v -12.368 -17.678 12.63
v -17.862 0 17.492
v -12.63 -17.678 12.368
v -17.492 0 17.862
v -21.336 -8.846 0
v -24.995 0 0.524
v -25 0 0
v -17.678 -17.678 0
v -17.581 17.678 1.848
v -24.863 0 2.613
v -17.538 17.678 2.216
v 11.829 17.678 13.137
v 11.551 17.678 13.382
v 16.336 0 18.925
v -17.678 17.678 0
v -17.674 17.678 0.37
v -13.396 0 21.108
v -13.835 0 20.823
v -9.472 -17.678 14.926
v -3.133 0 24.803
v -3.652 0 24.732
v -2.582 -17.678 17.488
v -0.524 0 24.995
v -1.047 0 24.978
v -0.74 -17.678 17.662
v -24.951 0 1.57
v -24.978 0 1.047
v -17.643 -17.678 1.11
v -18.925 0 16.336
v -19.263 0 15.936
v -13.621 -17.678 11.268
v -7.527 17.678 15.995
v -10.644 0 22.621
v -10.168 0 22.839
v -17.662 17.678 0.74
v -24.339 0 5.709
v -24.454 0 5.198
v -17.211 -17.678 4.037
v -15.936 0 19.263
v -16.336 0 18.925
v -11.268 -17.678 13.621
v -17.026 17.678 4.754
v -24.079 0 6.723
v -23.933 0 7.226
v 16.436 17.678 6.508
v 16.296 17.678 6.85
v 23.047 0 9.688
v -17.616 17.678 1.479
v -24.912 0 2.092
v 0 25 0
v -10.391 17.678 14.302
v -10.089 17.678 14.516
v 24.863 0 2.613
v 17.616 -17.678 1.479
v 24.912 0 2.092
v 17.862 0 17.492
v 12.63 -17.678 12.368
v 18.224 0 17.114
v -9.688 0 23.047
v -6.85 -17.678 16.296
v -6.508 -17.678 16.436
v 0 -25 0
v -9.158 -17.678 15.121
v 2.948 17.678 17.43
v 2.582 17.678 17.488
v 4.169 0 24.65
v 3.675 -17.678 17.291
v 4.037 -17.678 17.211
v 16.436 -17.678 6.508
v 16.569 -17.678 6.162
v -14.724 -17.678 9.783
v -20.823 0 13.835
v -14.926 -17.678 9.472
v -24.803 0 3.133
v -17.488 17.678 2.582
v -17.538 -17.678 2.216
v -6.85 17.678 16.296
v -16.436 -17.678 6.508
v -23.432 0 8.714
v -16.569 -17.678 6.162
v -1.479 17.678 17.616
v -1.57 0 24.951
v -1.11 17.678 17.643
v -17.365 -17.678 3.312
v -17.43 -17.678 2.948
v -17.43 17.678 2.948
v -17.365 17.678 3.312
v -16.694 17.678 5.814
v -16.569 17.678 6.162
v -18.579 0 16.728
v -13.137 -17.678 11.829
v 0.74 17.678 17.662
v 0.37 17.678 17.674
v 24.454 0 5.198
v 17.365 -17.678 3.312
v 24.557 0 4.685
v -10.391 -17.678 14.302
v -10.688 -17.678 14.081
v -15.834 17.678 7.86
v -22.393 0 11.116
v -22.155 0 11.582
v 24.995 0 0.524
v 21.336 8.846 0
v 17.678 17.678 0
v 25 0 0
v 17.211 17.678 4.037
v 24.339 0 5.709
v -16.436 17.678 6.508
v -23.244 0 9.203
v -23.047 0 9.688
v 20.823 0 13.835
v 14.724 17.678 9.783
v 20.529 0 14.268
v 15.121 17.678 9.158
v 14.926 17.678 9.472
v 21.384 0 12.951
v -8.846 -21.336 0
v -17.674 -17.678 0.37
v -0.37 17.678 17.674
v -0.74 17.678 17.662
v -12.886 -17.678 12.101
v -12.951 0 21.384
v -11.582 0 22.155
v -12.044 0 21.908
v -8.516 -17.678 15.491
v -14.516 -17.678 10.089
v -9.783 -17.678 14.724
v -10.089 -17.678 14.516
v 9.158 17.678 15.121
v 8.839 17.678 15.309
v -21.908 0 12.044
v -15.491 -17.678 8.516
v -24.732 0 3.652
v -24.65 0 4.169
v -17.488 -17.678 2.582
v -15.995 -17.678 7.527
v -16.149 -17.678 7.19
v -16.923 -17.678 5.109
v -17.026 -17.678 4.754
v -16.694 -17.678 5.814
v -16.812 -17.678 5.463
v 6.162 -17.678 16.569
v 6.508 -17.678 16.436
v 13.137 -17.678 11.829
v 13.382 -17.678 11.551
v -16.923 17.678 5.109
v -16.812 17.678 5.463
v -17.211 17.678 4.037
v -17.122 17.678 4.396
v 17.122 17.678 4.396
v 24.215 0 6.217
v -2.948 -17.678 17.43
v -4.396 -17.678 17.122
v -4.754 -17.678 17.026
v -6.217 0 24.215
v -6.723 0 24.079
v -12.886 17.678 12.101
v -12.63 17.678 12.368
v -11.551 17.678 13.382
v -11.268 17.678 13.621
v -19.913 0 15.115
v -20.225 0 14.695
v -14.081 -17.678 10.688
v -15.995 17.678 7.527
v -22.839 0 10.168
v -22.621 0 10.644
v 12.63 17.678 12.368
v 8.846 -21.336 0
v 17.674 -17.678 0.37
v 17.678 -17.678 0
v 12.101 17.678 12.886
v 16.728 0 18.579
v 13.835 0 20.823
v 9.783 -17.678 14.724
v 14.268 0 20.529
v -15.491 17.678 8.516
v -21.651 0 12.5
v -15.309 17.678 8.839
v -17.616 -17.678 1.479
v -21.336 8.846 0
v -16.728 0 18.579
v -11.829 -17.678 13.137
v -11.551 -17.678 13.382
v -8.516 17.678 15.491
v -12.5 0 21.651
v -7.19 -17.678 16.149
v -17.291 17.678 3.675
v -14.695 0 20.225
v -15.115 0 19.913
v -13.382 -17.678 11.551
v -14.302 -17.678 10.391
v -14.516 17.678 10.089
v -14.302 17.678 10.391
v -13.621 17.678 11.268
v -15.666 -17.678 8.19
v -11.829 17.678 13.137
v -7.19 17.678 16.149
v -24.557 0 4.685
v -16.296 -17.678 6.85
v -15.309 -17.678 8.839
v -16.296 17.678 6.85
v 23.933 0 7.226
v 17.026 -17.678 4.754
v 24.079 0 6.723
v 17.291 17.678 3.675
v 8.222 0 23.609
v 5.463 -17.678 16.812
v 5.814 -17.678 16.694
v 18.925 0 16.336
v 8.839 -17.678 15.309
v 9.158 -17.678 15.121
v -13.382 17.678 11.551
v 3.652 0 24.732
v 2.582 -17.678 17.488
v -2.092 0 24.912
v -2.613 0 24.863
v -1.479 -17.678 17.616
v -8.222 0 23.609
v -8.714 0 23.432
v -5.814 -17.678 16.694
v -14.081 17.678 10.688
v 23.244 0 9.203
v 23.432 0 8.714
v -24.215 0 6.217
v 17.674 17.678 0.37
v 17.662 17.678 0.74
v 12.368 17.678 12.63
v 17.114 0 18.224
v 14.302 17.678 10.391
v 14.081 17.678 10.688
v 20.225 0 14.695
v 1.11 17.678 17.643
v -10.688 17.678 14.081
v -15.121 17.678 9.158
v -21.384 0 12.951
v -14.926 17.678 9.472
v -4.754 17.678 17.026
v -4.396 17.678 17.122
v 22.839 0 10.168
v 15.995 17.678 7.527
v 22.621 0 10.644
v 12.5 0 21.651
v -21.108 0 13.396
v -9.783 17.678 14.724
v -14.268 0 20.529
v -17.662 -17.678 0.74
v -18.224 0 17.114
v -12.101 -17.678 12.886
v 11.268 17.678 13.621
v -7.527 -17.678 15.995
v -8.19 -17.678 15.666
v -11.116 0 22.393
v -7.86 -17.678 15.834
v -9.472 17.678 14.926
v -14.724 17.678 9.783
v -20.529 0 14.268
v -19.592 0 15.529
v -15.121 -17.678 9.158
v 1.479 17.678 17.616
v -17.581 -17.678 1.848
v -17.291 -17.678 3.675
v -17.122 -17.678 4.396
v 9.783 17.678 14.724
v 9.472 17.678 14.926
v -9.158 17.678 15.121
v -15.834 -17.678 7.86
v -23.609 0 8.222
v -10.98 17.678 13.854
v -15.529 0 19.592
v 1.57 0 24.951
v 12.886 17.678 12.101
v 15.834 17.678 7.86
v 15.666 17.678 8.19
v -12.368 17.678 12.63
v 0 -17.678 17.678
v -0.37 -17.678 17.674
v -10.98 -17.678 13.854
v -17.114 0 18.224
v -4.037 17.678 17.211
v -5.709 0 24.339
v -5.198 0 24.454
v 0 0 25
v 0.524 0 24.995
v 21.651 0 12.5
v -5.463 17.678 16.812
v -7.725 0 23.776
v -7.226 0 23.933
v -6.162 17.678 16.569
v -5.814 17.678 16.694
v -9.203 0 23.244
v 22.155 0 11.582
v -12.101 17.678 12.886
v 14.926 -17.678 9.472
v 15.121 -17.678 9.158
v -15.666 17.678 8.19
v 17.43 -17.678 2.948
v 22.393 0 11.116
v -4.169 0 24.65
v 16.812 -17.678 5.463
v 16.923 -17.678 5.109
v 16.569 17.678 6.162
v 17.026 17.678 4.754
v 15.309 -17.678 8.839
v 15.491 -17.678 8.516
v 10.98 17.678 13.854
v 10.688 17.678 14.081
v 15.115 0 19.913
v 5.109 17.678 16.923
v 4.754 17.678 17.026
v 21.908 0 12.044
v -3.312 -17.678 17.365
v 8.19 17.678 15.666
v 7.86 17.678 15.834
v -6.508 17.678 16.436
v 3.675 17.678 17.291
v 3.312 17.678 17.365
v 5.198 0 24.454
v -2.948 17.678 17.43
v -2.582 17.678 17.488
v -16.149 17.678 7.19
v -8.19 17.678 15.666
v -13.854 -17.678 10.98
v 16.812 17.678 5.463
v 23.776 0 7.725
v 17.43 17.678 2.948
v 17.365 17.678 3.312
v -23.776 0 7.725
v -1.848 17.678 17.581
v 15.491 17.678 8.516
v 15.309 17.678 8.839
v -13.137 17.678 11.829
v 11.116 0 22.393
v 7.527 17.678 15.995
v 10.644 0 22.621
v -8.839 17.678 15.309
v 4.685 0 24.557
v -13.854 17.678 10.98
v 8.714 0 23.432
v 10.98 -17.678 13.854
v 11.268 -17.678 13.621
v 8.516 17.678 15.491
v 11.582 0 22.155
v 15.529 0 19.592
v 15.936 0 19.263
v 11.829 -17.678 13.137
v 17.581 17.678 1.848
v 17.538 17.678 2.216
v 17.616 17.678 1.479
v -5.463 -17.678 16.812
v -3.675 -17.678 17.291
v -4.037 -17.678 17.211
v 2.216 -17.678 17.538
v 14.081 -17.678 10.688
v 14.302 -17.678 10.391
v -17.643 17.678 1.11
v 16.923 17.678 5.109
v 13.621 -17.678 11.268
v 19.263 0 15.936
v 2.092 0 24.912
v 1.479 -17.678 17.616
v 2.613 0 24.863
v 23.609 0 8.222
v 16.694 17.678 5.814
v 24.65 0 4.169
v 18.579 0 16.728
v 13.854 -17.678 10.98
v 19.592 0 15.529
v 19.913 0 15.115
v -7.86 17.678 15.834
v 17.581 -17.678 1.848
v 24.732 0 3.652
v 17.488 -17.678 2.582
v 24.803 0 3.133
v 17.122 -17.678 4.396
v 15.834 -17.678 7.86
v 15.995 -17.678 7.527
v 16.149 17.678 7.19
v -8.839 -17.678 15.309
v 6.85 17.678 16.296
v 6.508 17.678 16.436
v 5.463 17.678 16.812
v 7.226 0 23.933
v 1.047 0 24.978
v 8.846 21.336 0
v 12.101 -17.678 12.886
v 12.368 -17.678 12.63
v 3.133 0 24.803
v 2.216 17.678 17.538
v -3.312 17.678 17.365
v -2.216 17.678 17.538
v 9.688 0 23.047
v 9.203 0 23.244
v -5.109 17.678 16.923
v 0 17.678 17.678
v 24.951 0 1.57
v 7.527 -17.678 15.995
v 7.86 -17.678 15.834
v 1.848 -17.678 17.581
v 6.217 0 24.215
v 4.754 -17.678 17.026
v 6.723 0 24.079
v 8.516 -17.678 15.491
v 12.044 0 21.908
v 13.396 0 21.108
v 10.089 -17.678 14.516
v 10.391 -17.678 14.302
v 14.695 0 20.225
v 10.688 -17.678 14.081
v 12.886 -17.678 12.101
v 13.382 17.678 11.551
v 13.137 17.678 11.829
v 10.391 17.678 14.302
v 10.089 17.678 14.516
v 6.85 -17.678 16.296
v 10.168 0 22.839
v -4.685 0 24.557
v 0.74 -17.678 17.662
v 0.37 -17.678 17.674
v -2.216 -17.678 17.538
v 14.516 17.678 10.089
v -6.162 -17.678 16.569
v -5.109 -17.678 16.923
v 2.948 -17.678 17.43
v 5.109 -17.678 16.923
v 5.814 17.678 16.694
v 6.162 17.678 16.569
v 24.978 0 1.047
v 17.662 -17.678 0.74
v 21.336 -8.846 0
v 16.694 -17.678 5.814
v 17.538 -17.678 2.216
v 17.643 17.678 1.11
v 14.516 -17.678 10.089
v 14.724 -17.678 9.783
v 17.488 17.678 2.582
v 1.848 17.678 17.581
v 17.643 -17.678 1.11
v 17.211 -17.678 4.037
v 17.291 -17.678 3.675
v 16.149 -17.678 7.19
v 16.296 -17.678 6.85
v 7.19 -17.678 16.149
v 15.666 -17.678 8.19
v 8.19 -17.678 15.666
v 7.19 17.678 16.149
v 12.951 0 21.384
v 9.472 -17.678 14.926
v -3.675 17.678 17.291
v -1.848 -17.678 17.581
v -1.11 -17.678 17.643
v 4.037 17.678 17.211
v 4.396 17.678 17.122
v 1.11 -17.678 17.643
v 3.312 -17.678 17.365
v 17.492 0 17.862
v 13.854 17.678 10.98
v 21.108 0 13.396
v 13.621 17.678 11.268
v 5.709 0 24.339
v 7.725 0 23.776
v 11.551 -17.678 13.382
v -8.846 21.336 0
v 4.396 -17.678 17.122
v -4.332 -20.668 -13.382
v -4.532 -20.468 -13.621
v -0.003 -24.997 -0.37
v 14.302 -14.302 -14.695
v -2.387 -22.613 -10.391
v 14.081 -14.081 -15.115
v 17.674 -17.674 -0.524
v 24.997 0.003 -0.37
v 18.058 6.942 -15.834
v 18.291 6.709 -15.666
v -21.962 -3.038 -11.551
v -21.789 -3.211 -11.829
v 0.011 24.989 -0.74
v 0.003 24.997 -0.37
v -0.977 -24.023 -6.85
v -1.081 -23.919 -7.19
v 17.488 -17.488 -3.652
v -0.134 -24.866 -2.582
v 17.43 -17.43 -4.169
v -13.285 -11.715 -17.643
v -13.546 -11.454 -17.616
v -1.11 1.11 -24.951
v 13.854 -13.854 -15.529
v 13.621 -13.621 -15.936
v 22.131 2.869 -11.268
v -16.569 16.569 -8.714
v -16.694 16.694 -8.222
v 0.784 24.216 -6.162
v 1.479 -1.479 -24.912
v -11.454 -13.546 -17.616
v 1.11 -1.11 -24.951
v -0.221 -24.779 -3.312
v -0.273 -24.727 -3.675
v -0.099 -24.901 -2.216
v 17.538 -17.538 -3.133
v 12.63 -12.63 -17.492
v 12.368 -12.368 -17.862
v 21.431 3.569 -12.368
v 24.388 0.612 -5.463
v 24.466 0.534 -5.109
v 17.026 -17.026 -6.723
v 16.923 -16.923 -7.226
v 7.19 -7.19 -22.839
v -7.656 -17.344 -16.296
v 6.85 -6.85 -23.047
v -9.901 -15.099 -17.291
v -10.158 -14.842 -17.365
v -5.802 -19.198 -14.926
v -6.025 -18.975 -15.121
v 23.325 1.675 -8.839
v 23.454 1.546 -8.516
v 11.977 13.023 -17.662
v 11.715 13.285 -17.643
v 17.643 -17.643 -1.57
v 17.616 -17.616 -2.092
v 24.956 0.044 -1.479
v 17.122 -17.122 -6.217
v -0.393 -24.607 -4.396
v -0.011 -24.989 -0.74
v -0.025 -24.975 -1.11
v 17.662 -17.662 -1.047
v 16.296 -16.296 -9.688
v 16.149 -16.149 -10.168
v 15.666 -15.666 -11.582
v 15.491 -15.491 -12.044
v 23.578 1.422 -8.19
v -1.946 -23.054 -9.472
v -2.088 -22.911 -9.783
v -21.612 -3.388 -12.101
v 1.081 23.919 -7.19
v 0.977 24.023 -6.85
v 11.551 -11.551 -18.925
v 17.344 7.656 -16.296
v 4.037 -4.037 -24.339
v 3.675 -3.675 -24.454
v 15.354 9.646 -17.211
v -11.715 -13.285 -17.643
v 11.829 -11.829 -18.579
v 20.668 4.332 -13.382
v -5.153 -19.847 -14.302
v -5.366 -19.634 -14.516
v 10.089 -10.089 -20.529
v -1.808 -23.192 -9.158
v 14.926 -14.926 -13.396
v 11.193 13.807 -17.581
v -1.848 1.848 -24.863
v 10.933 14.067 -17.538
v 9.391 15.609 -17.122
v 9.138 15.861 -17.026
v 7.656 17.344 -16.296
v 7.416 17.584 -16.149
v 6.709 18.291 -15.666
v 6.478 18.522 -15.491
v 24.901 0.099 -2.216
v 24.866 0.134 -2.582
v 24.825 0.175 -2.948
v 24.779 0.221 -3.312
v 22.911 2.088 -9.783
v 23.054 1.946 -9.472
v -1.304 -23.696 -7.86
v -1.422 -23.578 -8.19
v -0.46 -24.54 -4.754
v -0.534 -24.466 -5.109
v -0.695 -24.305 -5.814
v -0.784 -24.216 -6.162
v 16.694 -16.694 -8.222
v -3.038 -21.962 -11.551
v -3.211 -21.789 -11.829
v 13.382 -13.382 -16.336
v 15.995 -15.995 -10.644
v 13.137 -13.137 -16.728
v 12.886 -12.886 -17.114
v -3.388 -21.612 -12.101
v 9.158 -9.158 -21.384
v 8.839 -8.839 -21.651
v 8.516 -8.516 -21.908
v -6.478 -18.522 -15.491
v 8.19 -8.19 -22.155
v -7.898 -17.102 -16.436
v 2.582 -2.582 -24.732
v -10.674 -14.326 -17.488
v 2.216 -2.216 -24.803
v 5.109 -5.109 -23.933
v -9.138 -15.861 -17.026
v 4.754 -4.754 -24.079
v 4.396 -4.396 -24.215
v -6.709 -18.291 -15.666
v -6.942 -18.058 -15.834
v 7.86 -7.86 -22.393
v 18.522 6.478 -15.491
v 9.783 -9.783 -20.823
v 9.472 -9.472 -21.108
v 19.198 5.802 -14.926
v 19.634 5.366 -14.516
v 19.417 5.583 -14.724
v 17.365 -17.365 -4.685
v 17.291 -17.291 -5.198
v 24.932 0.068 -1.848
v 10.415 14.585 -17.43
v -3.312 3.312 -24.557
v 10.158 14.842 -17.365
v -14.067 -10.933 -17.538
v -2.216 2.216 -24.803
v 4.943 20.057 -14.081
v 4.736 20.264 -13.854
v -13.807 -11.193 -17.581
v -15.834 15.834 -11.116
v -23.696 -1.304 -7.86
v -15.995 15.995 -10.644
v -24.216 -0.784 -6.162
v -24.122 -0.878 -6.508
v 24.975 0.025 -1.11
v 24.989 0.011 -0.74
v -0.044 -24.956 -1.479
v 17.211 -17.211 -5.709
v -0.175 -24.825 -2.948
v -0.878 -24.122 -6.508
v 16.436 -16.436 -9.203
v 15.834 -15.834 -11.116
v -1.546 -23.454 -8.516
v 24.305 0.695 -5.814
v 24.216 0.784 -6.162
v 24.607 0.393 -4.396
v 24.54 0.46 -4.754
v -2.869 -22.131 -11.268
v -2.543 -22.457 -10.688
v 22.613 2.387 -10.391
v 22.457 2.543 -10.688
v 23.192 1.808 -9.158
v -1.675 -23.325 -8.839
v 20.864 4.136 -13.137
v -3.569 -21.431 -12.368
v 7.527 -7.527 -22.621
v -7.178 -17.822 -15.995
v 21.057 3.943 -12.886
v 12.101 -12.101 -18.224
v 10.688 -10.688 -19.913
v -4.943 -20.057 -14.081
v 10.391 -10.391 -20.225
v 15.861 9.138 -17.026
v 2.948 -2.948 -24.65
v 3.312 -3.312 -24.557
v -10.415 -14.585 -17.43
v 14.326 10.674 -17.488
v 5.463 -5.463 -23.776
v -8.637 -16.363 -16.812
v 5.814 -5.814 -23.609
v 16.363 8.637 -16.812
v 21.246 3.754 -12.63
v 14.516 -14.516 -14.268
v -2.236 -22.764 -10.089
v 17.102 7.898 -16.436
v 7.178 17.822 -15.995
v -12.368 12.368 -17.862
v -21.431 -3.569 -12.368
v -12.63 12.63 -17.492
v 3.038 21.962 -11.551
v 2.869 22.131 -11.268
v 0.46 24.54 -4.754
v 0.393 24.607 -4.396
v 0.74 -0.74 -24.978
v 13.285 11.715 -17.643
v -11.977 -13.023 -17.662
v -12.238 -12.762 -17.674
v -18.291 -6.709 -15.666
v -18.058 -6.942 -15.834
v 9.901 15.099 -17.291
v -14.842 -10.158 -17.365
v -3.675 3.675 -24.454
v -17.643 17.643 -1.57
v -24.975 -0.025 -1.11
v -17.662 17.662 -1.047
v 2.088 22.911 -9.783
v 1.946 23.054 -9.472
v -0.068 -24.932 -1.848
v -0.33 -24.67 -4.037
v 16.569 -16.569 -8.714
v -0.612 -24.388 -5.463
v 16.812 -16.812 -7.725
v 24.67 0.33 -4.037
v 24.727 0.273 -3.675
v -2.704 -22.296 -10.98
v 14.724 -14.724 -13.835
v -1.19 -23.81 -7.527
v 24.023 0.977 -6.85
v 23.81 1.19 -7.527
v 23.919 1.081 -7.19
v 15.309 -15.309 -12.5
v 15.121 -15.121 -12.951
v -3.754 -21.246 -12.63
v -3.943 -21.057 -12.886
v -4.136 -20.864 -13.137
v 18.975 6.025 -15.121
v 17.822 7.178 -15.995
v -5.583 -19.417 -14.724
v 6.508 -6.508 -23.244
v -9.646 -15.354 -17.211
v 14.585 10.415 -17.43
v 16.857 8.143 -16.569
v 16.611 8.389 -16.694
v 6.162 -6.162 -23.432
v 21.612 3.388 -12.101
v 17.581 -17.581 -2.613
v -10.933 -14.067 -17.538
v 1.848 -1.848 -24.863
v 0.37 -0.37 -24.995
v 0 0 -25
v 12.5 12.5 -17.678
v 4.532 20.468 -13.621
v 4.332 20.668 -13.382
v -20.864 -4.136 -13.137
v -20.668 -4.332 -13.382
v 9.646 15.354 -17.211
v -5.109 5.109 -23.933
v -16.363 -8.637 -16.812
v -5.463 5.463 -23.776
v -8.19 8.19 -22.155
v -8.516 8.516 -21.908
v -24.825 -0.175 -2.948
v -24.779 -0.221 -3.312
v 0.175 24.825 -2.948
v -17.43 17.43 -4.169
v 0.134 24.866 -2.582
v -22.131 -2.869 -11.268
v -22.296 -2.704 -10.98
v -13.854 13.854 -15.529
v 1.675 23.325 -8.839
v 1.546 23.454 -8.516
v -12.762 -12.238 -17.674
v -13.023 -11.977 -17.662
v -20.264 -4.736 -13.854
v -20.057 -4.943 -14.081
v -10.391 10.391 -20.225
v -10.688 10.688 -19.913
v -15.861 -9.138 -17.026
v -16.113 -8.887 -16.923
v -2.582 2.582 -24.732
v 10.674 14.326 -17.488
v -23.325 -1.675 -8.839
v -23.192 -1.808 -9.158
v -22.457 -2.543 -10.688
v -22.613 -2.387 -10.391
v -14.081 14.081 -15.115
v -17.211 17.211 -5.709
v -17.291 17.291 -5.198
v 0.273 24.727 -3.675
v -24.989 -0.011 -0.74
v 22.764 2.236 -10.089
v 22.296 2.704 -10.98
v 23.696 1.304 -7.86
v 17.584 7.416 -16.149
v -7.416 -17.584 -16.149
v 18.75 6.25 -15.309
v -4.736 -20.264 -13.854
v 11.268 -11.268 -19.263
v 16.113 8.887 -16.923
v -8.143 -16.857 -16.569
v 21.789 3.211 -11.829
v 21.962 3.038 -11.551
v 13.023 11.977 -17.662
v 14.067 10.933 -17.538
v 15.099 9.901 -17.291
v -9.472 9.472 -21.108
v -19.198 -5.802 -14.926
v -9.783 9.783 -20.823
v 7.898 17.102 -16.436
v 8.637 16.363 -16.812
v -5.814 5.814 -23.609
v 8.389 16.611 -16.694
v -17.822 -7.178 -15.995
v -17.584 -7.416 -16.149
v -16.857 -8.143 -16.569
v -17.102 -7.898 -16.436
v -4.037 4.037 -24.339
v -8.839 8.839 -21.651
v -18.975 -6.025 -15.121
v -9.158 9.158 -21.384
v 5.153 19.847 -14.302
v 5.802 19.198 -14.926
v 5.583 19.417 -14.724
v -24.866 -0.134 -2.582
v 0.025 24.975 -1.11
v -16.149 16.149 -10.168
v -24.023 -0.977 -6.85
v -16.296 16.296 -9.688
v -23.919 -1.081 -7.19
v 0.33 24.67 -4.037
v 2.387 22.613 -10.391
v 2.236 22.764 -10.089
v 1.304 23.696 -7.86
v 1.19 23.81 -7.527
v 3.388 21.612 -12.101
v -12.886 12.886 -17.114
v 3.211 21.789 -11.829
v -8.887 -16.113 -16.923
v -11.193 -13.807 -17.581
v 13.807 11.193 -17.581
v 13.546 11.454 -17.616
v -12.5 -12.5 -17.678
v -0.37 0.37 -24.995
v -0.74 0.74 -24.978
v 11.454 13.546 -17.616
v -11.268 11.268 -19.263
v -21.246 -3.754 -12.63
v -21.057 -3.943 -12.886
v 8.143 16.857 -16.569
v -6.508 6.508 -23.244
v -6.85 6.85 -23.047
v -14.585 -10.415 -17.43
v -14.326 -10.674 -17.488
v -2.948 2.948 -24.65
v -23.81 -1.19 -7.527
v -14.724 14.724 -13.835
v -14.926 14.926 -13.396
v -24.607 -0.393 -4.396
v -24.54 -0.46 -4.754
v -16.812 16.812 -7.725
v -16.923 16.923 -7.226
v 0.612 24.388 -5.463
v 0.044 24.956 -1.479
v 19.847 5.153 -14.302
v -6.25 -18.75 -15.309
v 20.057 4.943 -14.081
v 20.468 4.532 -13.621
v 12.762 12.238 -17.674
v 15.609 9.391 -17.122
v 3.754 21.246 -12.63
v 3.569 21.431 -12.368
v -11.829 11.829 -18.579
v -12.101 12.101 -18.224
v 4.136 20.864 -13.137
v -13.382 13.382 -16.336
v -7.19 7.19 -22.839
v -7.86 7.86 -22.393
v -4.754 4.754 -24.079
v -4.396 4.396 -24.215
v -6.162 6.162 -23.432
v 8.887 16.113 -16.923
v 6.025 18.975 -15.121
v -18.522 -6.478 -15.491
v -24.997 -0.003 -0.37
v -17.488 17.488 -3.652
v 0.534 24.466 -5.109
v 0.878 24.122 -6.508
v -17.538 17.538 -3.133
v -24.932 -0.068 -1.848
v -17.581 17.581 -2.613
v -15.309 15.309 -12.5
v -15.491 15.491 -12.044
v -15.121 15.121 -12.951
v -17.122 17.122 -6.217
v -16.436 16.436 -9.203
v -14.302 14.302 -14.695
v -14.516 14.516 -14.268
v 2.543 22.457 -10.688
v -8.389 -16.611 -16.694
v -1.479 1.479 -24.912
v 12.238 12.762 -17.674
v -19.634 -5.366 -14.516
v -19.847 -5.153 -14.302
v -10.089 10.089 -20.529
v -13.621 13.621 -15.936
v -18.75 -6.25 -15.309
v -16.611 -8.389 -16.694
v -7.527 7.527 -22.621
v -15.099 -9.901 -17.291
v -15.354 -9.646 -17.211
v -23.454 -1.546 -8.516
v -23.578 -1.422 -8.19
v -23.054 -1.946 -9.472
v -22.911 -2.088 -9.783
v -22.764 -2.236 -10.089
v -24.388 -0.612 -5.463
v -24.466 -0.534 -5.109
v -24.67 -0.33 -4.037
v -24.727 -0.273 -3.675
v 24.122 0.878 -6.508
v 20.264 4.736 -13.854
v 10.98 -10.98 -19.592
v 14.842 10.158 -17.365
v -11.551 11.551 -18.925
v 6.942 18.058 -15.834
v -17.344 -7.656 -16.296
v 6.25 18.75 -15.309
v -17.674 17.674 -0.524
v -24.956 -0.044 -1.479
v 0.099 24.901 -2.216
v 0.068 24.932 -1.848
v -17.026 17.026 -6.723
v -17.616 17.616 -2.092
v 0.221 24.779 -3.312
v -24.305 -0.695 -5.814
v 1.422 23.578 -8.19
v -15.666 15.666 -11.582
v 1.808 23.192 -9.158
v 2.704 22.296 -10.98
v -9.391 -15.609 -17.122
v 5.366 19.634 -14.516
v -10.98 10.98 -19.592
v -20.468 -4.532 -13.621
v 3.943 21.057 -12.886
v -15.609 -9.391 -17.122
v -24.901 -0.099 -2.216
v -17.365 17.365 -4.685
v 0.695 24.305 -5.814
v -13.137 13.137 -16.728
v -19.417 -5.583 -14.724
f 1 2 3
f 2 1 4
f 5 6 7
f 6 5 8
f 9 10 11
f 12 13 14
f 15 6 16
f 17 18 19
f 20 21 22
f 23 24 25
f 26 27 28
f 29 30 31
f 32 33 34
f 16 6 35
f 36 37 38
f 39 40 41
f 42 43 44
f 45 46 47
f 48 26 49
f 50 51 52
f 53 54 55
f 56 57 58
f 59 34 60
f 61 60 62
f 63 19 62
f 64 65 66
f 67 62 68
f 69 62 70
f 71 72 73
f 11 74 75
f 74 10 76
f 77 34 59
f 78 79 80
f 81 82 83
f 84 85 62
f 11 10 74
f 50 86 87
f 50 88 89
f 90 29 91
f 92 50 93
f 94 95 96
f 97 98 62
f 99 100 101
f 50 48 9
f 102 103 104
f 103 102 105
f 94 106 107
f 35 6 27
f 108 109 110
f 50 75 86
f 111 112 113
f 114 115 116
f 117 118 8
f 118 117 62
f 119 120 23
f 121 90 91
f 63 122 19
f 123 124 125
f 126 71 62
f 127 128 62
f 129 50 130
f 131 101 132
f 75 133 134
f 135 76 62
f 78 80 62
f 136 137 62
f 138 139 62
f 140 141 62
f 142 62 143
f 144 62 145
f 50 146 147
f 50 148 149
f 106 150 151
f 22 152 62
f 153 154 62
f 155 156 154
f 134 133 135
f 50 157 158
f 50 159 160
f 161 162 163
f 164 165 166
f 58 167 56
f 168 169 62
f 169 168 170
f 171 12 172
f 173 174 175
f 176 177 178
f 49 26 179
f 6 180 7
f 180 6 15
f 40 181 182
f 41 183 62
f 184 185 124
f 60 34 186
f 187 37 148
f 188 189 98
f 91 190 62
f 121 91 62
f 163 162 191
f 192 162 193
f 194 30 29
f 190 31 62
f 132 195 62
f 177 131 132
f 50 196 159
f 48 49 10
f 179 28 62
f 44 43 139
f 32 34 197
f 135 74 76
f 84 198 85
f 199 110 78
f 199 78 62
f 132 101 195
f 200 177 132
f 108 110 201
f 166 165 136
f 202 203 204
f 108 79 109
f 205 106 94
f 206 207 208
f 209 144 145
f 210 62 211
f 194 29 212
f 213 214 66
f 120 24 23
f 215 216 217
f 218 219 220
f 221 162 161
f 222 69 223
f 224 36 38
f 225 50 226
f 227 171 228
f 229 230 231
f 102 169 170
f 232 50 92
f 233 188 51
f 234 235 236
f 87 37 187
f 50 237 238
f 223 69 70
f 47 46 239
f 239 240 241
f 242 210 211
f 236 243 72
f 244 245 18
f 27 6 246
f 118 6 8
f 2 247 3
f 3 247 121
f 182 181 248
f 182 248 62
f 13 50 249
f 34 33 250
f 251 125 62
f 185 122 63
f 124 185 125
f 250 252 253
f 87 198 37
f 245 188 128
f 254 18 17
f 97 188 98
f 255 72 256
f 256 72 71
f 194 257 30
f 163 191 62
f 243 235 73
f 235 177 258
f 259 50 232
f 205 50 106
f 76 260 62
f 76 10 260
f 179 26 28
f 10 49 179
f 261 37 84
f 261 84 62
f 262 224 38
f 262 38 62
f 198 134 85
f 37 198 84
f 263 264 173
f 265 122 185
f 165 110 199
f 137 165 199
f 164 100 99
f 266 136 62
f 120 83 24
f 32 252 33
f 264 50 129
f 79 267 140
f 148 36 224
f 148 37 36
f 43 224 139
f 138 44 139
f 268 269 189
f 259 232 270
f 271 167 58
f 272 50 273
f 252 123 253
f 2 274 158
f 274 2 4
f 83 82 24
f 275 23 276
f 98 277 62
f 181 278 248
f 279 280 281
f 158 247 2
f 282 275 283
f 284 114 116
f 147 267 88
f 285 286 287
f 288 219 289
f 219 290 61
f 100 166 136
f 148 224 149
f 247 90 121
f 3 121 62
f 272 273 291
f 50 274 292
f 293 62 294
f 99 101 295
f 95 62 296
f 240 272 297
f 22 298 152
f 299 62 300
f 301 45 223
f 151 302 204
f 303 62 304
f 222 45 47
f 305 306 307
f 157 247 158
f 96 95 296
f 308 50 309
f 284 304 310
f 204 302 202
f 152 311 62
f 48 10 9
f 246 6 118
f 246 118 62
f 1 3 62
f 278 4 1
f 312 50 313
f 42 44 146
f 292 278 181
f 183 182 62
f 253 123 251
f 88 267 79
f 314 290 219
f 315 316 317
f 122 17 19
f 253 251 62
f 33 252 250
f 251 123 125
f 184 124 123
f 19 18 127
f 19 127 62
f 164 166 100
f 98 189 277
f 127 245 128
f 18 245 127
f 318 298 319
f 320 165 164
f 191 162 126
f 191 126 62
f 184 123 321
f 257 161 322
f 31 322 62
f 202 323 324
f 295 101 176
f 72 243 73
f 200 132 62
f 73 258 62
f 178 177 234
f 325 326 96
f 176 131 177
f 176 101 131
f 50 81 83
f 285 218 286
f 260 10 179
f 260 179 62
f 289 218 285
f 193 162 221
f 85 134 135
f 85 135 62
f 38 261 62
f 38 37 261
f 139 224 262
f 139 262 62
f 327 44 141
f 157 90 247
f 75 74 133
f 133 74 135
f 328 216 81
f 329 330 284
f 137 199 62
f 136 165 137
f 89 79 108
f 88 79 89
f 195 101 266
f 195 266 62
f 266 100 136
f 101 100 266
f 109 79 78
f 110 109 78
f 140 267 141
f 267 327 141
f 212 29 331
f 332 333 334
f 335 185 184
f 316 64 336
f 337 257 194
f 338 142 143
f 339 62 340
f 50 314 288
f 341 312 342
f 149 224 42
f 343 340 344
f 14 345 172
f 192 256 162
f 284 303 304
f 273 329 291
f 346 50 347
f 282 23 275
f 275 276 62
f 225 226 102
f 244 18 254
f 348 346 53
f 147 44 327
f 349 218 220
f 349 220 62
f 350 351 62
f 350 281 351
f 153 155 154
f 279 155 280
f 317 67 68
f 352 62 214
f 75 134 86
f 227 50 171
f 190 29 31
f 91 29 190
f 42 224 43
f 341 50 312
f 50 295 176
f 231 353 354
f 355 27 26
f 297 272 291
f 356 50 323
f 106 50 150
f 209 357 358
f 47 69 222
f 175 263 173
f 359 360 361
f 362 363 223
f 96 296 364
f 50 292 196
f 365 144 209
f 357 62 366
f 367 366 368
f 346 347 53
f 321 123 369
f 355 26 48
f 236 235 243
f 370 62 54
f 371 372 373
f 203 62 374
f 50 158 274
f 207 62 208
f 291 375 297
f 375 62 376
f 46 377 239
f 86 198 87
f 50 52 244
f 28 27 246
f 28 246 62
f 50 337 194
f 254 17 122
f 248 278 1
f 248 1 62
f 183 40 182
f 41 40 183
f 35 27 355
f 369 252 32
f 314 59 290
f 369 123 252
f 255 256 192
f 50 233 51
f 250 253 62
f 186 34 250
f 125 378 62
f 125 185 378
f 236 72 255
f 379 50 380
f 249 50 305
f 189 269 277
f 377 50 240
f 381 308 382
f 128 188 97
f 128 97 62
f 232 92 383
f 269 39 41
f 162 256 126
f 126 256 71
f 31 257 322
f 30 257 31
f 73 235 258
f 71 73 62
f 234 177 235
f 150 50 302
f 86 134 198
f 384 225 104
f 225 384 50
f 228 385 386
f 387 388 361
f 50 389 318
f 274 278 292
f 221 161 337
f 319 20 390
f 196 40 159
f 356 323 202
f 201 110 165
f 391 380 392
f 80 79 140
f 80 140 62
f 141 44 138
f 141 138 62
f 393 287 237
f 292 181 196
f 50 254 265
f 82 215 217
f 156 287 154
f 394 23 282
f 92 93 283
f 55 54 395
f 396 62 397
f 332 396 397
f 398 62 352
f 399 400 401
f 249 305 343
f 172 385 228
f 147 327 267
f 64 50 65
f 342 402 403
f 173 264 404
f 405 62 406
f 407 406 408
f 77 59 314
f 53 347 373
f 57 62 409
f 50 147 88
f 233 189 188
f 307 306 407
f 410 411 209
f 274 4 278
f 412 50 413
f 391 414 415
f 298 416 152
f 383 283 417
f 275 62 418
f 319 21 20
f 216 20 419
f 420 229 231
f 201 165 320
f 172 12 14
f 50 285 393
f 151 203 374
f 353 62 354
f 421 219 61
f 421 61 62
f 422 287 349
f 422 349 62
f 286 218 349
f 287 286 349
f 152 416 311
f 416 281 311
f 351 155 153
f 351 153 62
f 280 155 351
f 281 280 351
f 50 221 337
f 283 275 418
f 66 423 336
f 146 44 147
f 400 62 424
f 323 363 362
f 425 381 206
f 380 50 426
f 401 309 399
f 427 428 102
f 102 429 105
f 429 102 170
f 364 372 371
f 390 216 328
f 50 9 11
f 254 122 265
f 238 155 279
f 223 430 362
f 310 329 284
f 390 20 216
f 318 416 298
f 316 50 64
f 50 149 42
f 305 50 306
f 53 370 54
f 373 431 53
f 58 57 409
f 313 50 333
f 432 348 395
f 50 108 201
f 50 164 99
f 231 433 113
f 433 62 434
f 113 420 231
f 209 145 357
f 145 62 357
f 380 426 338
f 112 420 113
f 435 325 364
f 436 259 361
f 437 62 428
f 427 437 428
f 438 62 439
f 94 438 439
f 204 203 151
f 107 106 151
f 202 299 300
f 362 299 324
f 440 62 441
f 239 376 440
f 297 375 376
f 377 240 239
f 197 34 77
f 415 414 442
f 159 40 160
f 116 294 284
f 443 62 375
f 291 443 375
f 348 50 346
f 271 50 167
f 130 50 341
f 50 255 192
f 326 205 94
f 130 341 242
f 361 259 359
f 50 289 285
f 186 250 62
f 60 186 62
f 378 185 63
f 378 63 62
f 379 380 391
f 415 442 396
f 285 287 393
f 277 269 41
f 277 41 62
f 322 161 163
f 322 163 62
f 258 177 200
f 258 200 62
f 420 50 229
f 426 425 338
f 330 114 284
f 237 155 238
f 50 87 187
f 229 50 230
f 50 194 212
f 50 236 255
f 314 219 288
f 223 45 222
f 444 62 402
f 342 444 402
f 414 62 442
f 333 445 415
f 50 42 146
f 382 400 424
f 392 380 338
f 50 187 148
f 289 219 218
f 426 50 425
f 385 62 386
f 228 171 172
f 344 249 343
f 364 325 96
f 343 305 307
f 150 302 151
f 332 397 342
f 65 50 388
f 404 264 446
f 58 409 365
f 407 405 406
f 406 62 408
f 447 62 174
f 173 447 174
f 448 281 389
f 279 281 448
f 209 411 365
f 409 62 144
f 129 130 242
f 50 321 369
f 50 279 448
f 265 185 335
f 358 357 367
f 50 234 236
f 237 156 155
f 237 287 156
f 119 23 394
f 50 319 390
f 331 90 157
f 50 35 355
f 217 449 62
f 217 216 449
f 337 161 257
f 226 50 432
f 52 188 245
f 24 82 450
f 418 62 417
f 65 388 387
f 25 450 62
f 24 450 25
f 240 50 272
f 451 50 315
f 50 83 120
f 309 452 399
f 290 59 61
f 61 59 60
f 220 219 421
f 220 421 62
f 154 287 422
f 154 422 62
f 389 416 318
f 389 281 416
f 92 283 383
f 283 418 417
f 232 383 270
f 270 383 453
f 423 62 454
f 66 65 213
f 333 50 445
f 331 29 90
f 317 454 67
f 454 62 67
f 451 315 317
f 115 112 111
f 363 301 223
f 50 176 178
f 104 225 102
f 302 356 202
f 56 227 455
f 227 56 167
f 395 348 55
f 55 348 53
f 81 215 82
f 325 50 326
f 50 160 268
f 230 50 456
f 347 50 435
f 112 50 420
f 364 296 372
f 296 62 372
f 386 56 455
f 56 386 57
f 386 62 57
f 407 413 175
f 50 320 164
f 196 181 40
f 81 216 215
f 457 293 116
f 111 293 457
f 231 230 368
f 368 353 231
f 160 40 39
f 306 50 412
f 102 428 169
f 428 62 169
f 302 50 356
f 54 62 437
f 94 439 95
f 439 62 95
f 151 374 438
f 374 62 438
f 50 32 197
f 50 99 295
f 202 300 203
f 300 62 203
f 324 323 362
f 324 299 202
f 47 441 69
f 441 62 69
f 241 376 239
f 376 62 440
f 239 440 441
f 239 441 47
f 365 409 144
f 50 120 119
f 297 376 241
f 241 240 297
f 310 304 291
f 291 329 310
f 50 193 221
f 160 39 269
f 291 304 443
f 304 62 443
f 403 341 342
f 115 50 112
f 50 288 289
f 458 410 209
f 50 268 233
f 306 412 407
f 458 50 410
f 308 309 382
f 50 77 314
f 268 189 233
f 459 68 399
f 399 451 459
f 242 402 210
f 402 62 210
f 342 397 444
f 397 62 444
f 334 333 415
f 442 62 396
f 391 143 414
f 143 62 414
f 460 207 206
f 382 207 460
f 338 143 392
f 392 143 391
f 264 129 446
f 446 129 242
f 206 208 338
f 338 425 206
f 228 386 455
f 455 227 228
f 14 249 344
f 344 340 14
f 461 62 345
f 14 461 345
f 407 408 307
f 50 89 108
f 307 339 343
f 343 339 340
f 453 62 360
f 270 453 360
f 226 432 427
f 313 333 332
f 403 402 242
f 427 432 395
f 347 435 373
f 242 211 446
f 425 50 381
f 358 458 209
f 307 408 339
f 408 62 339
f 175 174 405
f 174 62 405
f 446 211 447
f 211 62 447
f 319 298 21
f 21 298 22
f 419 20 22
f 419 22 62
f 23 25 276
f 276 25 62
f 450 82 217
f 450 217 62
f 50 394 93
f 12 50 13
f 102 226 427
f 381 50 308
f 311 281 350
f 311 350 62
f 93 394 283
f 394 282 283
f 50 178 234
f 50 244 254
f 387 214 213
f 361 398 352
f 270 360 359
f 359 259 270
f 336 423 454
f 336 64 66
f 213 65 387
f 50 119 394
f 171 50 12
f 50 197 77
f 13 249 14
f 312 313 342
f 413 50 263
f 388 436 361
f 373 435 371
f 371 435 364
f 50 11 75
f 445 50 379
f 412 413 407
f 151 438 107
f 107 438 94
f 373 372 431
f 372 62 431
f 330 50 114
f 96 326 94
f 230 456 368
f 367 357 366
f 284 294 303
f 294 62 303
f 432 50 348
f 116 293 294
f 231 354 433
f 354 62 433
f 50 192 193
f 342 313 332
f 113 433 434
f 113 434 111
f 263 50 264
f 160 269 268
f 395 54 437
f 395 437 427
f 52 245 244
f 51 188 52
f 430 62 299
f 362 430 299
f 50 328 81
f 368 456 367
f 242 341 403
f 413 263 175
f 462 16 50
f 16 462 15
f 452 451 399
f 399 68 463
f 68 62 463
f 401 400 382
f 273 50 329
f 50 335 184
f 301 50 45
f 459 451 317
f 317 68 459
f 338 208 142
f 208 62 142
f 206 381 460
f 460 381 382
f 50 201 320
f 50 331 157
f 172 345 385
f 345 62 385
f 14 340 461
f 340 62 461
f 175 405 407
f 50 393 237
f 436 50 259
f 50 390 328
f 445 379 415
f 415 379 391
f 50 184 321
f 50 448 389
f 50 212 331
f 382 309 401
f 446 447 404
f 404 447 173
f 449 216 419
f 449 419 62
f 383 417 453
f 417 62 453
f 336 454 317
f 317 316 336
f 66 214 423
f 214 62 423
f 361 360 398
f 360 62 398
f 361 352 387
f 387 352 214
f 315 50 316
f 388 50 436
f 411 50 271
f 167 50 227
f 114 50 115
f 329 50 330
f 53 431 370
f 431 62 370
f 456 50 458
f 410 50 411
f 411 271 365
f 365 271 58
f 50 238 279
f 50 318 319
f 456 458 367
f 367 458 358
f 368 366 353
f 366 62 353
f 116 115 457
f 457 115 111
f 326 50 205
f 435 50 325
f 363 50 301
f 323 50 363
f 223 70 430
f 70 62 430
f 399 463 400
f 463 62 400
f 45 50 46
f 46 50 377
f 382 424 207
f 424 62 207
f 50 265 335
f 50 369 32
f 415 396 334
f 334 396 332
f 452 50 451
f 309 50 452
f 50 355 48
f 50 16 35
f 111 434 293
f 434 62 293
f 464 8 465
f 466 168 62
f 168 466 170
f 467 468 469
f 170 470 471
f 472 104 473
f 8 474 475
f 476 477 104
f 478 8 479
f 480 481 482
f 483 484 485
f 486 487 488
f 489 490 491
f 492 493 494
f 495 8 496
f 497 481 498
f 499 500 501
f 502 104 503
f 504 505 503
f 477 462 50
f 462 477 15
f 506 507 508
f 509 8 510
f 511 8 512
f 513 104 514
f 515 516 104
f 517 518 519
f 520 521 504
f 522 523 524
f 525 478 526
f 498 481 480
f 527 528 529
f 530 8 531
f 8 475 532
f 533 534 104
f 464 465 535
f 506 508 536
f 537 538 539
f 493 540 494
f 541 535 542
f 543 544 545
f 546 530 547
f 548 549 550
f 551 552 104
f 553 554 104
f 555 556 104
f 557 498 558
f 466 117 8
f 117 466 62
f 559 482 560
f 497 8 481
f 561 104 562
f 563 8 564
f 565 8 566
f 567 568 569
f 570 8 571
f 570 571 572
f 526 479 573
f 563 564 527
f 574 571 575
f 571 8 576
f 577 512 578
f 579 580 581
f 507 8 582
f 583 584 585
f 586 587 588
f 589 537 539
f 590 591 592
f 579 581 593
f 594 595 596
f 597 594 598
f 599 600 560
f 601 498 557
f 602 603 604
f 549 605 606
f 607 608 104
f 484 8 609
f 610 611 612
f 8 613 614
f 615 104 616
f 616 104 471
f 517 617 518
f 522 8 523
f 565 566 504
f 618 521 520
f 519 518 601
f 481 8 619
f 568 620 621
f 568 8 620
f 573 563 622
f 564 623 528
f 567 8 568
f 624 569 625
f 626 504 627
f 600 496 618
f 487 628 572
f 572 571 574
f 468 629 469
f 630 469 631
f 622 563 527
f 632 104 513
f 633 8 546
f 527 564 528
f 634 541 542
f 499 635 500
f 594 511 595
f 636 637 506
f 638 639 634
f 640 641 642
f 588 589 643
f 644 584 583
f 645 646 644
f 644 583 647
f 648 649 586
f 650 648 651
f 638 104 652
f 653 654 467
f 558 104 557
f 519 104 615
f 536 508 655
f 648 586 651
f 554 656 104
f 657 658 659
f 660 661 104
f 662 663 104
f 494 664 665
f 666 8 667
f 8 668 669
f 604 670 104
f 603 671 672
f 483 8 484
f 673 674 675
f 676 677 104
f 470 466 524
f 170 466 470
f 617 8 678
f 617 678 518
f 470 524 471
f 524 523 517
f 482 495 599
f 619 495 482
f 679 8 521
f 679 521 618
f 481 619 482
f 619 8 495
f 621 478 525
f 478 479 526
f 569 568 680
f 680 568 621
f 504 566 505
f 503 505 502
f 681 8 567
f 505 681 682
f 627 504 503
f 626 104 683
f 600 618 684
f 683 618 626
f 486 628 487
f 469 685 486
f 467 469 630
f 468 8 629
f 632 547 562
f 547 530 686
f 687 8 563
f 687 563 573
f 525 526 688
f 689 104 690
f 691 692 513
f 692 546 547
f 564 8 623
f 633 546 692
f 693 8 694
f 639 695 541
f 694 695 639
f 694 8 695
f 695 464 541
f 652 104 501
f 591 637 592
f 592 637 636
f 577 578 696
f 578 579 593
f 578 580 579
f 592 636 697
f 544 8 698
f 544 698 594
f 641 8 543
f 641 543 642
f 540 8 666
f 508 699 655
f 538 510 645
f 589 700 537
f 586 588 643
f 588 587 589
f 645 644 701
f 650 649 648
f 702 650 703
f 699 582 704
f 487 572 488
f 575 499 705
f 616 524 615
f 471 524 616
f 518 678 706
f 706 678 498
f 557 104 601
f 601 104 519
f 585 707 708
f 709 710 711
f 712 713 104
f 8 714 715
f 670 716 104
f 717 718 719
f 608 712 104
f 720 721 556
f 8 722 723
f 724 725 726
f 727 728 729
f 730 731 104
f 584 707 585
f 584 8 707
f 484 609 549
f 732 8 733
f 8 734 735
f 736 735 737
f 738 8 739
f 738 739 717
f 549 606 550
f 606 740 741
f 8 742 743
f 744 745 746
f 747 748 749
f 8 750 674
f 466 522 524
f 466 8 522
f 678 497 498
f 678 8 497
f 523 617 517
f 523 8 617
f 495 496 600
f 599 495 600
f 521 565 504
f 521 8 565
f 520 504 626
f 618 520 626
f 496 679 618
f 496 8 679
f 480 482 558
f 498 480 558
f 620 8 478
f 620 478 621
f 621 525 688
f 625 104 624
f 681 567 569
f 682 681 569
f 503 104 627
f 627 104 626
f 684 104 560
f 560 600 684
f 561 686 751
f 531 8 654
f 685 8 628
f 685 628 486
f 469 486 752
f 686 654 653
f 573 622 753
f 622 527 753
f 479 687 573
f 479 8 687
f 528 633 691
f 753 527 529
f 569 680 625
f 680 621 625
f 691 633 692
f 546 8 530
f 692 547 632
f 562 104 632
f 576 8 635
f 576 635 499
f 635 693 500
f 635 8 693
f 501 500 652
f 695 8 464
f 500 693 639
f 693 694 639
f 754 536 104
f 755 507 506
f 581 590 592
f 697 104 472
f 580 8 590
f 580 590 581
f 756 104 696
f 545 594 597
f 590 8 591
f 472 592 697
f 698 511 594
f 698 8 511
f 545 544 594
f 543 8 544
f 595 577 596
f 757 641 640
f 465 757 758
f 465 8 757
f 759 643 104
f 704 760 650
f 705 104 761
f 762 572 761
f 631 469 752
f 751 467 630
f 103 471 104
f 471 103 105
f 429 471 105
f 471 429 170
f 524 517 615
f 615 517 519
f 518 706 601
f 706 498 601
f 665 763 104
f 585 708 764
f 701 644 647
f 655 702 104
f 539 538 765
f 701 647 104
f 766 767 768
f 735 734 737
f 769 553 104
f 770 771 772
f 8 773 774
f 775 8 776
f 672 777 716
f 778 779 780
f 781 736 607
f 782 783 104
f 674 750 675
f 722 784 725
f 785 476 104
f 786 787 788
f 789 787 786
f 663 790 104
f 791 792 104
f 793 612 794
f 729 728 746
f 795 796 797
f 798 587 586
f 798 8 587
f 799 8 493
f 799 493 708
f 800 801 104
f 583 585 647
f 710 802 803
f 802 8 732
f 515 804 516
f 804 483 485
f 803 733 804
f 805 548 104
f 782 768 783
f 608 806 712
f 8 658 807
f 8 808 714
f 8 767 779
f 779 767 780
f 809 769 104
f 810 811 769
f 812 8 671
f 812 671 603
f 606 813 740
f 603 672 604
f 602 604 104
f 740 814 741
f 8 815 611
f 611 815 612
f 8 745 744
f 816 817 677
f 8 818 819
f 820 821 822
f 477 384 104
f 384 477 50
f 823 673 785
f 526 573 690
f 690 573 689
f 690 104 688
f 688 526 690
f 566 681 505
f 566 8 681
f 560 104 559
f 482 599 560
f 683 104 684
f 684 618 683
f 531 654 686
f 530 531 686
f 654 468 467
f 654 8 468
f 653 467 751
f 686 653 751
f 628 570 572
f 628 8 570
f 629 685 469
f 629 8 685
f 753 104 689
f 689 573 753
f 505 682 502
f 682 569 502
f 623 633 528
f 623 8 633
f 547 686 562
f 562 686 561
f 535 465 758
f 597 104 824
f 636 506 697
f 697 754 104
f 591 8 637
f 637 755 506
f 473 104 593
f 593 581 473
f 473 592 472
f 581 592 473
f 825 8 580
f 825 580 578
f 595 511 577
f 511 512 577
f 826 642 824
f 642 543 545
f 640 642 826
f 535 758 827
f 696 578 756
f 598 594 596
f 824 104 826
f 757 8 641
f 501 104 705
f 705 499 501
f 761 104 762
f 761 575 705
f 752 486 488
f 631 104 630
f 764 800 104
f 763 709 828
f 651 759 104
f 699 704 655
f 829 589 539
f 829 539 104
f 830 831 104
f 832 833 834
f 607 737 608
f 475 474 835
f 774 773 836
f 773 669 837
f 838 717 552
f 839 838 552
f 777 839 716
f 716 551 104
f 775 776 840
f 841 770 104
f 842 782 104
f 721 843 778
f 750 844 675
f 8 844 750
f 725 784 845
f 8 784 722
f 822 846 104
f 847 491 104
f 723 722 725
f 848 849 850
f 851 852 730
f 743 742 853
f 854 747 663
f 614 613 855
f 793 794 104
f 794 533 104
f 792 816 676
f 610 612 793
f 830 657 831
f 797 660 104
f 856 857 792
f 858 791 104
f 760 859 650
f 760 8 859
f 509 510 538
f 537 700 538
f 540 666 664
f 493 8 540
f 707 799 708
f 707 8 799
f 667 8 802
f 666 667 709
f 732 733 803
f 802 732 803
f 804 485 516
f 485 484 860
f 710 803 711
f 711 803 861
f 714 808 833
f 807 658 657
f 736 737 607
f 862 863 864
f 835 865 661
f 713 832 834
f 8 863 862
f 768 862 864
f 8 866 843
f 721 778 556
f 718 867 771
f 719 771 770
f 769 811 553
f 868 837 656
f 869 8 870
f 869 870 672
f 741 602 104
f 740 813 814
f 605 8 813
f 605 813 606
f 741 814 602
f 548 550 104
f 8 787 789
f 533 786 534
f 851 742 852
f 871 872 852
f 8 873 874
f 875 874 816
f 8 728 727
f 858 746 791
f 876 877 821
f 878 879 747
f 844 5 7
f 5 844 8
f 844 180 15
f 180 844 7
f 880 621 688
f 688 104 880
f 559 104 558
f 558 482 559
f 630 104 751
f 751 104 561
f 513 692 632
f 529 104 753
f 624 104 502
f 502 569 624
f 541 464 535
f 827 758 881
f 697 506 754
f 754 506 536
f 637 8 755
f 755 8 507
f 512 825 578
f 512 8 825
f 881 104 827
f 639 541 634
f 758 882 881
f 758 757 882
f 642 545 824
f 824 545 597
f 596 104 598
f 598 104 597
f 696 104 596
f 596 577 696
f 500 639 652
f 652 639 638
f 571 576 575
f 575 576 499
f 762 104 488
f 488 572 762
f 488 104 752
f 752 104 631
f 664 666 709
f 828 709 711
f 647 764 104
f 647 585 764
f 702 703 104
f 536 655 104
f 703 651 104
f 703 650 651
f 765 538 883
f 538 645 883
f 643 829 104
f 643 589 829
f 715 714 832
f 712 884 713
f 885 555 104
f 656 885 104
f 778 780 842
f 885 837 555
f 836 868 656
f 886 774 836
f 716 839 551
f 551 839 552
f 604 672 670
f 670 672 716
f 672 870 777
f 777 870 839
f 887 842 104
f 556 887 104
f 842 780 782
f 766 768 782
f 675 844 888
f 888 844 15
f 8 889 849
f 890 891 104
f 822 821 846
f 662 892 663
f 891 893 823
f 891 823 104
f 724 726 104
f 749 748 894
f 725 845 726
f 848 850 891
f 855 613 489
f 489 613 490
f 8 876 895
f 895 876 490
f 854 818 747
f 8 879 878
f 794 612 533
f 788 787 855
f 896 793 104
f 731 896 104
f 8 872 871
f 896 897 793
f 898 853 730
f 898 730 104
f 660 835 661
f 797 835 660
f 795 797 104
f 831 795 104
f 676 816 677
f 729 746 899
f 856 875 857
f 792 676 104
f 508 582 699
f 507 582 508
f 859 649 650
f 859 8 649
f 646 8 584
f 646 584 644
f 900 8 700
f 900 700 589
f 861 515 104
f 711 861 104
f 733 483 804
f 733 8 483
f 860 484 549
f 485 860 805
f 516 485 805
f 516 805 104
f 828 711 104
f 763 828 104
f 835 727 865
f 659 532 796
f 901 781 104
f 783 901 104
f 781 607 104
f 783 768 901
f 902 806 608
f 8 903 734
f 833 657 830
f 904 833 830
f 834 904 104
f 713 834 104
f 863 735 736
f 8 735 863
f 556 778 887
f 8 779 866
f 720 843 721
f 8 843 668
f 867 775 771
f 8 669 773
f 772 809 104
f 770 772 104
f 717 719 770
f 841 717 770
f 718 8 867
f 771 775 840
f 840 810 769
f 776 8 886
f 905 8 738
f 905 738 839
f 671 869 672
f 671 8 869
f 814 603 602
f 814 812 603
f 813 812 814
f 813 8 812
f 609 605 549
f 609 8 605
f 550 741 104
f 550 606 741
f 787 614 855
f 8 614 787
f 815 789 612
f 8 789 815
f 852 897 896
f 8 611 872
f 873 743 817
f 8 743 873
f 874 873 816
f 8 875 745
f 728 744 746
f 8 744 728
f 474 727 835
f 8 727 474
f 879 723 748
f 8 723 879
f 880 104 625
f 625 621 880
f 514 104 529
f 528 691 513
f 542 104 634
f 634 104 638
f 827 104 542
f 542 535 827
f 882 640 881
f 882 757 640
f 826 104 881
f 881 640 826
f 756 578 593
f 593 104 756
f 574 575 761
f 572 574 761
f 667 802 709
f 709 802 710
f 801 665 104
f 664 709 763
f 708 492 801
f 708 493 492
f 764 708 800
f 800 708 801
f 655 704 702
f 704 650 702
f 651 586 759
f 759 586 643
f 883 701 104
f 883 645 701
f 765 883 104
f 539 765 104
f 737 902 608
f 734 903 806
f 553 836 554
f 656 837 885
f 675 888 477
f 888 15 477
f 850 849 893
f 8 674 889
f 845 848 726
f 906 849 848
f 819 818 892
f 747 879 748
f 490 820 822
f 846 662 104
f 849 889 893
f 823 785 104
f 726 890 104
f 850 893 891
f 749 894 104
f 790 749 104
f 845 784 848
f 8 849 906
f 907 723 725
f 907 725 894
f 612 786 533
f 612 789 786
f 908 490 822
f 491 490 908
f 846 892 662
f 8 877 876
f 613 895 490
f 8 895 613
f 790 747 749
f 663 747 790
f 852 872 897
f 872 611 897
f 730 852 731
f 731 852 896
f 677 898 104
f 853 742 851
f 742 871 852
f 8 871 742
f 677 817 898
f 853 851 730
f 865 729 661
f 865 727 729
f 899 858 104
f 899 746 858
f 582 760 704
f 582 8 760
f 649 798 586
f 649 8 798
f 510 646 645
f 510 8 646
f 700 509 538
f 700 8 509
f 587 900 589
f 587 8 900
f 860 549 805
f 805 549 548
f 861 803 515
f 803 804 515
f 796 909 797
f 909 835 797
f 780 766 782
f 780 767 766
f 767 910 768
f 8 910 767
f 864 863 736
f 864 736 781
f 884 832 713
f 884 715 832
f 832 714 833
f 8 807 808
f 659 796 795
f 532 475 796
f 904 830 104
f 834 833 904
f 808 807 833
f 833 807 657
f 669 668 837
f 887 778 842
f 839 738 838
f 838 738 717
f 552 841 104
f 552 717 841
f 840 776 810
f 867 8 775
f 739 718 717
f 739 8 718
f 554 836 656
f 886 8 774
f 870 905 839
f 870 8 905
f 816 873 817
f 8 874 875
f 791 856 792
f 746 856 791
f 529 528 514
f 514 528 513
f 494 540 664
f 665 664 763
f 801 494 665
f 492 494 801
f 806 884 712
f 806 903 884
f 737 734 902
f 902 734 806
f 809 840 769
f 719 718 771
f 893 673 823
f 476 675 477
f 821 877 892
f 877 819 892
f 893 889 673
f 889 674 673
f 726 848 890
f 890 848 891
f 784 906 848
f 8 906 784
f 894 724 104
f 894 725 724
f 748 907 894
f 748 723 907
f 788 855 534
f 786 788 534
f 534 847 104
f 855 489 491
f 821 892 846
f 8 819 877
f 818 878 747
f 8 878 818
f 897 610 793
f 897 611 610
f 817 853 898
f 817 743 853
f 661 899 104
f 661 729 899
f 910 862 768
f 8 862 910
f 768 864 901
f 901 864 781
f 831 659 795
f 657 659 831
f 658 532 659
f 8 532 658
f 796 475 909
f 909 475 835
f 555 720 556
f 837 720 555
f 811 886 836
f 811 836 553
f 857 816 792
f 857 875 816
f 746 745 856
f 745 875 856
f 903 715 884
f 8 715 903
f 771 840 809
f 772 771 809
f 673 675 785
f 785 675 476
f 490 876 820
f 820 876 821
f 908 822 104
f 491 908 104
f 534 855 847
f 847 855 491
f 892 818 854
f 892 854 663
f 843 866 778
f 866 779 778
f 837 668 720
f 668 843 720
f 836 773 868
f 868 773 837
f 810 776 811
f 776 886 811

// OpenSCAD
/*==============================================================================*\
	Welcome to my sphericon generator.
	
	I made this because I got tired of drawing sphericons after the second one.
	I'm a programmer, so in my mind it was impossible to not think about
	automating the drawing of this sort of shape.
	
	All units are meant to be in mm but I guess you can choose to use imperials
	if you want to keep suffering.
	
	Hit F6 to generate the half sphericon, and use the settings below to modify
	its properties.
\*==============================================================================*/

//========================Main settings========================
/* [ Main settings ] */

//Size of the sphericon
diameter = 50;

//Number of sides
sidecount = 8;

//Generation complexity (how smooth you want it to be. High values take longer to render)
smoothness = 300;

//========================Settings for fixture pin========================
/* [ Fixture pin ] */

//Set to true to generate sphericon, set to false to generate fixture pin
genSphericon = "yes"; // [yes,no]

//Set to true for cylinder pin, allowing rotation while assembled. Set to false for key pin, requiring desassembly to change face orientations
genCylinder = "no"; // [yes,no]

//clearance of fixture pin on its diameter
clearance = 0.2;

//clearance of fixture pin on its depth (aka the distance to the overhangs)
depthDiff = 2;

//========================Settings for full sphericon========================
/* [ Full sphericon ] */

//set to true to draw full sphericon (not half), useful to visualize the final result or if you have soluble support filament or a resin printer, you could print it in one piece.
drawFull = "yes"; // [yes,no]

//steps of rotation of second half (keep at 1 for "true" sphericon) note: not all step counts allign both half correctly, it depends on how many sides the base polygon has. (I was too lazy to understand it, so just play around with it until it looks right.)
rotationSteps = 1;

/*==============================================================================*\
	Code begins after this point, don't judge, it's my first attempt at openSCAD,
	so yes it's some very ugly code, but it works. I will most likely rework it
	in the future to add some generation features or simply to make it less
	disgusting.
	
	Read at your own risks, might burn your eyes.
\*==============================================================================*/

/* [ Hidden ] */

//main logic
if (genSphericon == "yes")
{
	if (drawFull == "no")
	{
		difference()
		{
			rotate(a = [-90,0,-90]) drawHalfSphericon();

			if (genCylinder == "yes")
			{
				drawCylinderPin();				
			}
			else
			{
				drawKeyPin();
			}
		}
	}
	else
	{
		union()
		{
			rotate(a = [-90, 0, 0]) drawHalfSphericon();
			rotate(a = [90, 0, getPolygonAngle(sidecount) * rotationSteps])drawHalfSphericon();
		}
	}
}
else
{
	if (genCylinder == "yes")
	{
		drawCylinderPin(clearance, depthDiff);
	}
	else
	{
		drawKeyPin(clearance, depthDiff);
	}
}

//Modified from suggested code on openSCAD's wiki to allow half polygons
module regularPolygon(order, r=1, half=false)
{
 	angles=[ for (i = [0:order-1]) i*(360/order) ];
 	coords=[ for (th=angles) [r*cos(th), r*sin(th)] ];
	
	if (half == true)
	{
		coords2=[ for (i = [0:getCoordCount(order) - 1]) coords[i]];
		coords3=concat([for (i=[0:len(coords2)-2]) coords[i]], [[coords2[len(coords2)-1][0], 0]]);
        
		polygon(coords3);
	}
	else
	{
		polygon(coords);
	}
 }
 
 //Gets how many vertices should be kept to draw half polygon
 function getCoordCount(count) = (floor(0.5*count) + (count%2) + 1);
 
 //Gets the angle between edges of the polygon
 function getPolygonAngle(sideCount) = (((sideCount - 2)*180)/sideCount);
 
 //Draws the half polygon using global variables and centers it
 module drawHalfSphericon()
 {
	translate([ 0, 0,diameter/2]) rotate_extrude(angle = 180, $fn = smoothness)
	{
		rotate(a=[0,0,90]) translate([-diameter/2, 0, 0]) regularPolygon(sidecount,
																		 diameter/2, 
																		 true);
	}
 }
 
 //Draws the cylinder pin
 module drawCylinderPin(pClearance = 0, pDepthDiff = 0)
 {
	cylinder(h = diameter/3 - pDepthDiff, 
			r = diameter/10 - pClearance, 
			center = true, 
			$fn = smoothness); 
}

//Draws the key pin
module drawKeyPin(pClearance = 0, pDepthDiff = 0)
{
	linear_extrude(height = diameter/3 - pDepthDiff, center = true) regularPolygon(sidecount, diameter/5 - pClearance);
}
